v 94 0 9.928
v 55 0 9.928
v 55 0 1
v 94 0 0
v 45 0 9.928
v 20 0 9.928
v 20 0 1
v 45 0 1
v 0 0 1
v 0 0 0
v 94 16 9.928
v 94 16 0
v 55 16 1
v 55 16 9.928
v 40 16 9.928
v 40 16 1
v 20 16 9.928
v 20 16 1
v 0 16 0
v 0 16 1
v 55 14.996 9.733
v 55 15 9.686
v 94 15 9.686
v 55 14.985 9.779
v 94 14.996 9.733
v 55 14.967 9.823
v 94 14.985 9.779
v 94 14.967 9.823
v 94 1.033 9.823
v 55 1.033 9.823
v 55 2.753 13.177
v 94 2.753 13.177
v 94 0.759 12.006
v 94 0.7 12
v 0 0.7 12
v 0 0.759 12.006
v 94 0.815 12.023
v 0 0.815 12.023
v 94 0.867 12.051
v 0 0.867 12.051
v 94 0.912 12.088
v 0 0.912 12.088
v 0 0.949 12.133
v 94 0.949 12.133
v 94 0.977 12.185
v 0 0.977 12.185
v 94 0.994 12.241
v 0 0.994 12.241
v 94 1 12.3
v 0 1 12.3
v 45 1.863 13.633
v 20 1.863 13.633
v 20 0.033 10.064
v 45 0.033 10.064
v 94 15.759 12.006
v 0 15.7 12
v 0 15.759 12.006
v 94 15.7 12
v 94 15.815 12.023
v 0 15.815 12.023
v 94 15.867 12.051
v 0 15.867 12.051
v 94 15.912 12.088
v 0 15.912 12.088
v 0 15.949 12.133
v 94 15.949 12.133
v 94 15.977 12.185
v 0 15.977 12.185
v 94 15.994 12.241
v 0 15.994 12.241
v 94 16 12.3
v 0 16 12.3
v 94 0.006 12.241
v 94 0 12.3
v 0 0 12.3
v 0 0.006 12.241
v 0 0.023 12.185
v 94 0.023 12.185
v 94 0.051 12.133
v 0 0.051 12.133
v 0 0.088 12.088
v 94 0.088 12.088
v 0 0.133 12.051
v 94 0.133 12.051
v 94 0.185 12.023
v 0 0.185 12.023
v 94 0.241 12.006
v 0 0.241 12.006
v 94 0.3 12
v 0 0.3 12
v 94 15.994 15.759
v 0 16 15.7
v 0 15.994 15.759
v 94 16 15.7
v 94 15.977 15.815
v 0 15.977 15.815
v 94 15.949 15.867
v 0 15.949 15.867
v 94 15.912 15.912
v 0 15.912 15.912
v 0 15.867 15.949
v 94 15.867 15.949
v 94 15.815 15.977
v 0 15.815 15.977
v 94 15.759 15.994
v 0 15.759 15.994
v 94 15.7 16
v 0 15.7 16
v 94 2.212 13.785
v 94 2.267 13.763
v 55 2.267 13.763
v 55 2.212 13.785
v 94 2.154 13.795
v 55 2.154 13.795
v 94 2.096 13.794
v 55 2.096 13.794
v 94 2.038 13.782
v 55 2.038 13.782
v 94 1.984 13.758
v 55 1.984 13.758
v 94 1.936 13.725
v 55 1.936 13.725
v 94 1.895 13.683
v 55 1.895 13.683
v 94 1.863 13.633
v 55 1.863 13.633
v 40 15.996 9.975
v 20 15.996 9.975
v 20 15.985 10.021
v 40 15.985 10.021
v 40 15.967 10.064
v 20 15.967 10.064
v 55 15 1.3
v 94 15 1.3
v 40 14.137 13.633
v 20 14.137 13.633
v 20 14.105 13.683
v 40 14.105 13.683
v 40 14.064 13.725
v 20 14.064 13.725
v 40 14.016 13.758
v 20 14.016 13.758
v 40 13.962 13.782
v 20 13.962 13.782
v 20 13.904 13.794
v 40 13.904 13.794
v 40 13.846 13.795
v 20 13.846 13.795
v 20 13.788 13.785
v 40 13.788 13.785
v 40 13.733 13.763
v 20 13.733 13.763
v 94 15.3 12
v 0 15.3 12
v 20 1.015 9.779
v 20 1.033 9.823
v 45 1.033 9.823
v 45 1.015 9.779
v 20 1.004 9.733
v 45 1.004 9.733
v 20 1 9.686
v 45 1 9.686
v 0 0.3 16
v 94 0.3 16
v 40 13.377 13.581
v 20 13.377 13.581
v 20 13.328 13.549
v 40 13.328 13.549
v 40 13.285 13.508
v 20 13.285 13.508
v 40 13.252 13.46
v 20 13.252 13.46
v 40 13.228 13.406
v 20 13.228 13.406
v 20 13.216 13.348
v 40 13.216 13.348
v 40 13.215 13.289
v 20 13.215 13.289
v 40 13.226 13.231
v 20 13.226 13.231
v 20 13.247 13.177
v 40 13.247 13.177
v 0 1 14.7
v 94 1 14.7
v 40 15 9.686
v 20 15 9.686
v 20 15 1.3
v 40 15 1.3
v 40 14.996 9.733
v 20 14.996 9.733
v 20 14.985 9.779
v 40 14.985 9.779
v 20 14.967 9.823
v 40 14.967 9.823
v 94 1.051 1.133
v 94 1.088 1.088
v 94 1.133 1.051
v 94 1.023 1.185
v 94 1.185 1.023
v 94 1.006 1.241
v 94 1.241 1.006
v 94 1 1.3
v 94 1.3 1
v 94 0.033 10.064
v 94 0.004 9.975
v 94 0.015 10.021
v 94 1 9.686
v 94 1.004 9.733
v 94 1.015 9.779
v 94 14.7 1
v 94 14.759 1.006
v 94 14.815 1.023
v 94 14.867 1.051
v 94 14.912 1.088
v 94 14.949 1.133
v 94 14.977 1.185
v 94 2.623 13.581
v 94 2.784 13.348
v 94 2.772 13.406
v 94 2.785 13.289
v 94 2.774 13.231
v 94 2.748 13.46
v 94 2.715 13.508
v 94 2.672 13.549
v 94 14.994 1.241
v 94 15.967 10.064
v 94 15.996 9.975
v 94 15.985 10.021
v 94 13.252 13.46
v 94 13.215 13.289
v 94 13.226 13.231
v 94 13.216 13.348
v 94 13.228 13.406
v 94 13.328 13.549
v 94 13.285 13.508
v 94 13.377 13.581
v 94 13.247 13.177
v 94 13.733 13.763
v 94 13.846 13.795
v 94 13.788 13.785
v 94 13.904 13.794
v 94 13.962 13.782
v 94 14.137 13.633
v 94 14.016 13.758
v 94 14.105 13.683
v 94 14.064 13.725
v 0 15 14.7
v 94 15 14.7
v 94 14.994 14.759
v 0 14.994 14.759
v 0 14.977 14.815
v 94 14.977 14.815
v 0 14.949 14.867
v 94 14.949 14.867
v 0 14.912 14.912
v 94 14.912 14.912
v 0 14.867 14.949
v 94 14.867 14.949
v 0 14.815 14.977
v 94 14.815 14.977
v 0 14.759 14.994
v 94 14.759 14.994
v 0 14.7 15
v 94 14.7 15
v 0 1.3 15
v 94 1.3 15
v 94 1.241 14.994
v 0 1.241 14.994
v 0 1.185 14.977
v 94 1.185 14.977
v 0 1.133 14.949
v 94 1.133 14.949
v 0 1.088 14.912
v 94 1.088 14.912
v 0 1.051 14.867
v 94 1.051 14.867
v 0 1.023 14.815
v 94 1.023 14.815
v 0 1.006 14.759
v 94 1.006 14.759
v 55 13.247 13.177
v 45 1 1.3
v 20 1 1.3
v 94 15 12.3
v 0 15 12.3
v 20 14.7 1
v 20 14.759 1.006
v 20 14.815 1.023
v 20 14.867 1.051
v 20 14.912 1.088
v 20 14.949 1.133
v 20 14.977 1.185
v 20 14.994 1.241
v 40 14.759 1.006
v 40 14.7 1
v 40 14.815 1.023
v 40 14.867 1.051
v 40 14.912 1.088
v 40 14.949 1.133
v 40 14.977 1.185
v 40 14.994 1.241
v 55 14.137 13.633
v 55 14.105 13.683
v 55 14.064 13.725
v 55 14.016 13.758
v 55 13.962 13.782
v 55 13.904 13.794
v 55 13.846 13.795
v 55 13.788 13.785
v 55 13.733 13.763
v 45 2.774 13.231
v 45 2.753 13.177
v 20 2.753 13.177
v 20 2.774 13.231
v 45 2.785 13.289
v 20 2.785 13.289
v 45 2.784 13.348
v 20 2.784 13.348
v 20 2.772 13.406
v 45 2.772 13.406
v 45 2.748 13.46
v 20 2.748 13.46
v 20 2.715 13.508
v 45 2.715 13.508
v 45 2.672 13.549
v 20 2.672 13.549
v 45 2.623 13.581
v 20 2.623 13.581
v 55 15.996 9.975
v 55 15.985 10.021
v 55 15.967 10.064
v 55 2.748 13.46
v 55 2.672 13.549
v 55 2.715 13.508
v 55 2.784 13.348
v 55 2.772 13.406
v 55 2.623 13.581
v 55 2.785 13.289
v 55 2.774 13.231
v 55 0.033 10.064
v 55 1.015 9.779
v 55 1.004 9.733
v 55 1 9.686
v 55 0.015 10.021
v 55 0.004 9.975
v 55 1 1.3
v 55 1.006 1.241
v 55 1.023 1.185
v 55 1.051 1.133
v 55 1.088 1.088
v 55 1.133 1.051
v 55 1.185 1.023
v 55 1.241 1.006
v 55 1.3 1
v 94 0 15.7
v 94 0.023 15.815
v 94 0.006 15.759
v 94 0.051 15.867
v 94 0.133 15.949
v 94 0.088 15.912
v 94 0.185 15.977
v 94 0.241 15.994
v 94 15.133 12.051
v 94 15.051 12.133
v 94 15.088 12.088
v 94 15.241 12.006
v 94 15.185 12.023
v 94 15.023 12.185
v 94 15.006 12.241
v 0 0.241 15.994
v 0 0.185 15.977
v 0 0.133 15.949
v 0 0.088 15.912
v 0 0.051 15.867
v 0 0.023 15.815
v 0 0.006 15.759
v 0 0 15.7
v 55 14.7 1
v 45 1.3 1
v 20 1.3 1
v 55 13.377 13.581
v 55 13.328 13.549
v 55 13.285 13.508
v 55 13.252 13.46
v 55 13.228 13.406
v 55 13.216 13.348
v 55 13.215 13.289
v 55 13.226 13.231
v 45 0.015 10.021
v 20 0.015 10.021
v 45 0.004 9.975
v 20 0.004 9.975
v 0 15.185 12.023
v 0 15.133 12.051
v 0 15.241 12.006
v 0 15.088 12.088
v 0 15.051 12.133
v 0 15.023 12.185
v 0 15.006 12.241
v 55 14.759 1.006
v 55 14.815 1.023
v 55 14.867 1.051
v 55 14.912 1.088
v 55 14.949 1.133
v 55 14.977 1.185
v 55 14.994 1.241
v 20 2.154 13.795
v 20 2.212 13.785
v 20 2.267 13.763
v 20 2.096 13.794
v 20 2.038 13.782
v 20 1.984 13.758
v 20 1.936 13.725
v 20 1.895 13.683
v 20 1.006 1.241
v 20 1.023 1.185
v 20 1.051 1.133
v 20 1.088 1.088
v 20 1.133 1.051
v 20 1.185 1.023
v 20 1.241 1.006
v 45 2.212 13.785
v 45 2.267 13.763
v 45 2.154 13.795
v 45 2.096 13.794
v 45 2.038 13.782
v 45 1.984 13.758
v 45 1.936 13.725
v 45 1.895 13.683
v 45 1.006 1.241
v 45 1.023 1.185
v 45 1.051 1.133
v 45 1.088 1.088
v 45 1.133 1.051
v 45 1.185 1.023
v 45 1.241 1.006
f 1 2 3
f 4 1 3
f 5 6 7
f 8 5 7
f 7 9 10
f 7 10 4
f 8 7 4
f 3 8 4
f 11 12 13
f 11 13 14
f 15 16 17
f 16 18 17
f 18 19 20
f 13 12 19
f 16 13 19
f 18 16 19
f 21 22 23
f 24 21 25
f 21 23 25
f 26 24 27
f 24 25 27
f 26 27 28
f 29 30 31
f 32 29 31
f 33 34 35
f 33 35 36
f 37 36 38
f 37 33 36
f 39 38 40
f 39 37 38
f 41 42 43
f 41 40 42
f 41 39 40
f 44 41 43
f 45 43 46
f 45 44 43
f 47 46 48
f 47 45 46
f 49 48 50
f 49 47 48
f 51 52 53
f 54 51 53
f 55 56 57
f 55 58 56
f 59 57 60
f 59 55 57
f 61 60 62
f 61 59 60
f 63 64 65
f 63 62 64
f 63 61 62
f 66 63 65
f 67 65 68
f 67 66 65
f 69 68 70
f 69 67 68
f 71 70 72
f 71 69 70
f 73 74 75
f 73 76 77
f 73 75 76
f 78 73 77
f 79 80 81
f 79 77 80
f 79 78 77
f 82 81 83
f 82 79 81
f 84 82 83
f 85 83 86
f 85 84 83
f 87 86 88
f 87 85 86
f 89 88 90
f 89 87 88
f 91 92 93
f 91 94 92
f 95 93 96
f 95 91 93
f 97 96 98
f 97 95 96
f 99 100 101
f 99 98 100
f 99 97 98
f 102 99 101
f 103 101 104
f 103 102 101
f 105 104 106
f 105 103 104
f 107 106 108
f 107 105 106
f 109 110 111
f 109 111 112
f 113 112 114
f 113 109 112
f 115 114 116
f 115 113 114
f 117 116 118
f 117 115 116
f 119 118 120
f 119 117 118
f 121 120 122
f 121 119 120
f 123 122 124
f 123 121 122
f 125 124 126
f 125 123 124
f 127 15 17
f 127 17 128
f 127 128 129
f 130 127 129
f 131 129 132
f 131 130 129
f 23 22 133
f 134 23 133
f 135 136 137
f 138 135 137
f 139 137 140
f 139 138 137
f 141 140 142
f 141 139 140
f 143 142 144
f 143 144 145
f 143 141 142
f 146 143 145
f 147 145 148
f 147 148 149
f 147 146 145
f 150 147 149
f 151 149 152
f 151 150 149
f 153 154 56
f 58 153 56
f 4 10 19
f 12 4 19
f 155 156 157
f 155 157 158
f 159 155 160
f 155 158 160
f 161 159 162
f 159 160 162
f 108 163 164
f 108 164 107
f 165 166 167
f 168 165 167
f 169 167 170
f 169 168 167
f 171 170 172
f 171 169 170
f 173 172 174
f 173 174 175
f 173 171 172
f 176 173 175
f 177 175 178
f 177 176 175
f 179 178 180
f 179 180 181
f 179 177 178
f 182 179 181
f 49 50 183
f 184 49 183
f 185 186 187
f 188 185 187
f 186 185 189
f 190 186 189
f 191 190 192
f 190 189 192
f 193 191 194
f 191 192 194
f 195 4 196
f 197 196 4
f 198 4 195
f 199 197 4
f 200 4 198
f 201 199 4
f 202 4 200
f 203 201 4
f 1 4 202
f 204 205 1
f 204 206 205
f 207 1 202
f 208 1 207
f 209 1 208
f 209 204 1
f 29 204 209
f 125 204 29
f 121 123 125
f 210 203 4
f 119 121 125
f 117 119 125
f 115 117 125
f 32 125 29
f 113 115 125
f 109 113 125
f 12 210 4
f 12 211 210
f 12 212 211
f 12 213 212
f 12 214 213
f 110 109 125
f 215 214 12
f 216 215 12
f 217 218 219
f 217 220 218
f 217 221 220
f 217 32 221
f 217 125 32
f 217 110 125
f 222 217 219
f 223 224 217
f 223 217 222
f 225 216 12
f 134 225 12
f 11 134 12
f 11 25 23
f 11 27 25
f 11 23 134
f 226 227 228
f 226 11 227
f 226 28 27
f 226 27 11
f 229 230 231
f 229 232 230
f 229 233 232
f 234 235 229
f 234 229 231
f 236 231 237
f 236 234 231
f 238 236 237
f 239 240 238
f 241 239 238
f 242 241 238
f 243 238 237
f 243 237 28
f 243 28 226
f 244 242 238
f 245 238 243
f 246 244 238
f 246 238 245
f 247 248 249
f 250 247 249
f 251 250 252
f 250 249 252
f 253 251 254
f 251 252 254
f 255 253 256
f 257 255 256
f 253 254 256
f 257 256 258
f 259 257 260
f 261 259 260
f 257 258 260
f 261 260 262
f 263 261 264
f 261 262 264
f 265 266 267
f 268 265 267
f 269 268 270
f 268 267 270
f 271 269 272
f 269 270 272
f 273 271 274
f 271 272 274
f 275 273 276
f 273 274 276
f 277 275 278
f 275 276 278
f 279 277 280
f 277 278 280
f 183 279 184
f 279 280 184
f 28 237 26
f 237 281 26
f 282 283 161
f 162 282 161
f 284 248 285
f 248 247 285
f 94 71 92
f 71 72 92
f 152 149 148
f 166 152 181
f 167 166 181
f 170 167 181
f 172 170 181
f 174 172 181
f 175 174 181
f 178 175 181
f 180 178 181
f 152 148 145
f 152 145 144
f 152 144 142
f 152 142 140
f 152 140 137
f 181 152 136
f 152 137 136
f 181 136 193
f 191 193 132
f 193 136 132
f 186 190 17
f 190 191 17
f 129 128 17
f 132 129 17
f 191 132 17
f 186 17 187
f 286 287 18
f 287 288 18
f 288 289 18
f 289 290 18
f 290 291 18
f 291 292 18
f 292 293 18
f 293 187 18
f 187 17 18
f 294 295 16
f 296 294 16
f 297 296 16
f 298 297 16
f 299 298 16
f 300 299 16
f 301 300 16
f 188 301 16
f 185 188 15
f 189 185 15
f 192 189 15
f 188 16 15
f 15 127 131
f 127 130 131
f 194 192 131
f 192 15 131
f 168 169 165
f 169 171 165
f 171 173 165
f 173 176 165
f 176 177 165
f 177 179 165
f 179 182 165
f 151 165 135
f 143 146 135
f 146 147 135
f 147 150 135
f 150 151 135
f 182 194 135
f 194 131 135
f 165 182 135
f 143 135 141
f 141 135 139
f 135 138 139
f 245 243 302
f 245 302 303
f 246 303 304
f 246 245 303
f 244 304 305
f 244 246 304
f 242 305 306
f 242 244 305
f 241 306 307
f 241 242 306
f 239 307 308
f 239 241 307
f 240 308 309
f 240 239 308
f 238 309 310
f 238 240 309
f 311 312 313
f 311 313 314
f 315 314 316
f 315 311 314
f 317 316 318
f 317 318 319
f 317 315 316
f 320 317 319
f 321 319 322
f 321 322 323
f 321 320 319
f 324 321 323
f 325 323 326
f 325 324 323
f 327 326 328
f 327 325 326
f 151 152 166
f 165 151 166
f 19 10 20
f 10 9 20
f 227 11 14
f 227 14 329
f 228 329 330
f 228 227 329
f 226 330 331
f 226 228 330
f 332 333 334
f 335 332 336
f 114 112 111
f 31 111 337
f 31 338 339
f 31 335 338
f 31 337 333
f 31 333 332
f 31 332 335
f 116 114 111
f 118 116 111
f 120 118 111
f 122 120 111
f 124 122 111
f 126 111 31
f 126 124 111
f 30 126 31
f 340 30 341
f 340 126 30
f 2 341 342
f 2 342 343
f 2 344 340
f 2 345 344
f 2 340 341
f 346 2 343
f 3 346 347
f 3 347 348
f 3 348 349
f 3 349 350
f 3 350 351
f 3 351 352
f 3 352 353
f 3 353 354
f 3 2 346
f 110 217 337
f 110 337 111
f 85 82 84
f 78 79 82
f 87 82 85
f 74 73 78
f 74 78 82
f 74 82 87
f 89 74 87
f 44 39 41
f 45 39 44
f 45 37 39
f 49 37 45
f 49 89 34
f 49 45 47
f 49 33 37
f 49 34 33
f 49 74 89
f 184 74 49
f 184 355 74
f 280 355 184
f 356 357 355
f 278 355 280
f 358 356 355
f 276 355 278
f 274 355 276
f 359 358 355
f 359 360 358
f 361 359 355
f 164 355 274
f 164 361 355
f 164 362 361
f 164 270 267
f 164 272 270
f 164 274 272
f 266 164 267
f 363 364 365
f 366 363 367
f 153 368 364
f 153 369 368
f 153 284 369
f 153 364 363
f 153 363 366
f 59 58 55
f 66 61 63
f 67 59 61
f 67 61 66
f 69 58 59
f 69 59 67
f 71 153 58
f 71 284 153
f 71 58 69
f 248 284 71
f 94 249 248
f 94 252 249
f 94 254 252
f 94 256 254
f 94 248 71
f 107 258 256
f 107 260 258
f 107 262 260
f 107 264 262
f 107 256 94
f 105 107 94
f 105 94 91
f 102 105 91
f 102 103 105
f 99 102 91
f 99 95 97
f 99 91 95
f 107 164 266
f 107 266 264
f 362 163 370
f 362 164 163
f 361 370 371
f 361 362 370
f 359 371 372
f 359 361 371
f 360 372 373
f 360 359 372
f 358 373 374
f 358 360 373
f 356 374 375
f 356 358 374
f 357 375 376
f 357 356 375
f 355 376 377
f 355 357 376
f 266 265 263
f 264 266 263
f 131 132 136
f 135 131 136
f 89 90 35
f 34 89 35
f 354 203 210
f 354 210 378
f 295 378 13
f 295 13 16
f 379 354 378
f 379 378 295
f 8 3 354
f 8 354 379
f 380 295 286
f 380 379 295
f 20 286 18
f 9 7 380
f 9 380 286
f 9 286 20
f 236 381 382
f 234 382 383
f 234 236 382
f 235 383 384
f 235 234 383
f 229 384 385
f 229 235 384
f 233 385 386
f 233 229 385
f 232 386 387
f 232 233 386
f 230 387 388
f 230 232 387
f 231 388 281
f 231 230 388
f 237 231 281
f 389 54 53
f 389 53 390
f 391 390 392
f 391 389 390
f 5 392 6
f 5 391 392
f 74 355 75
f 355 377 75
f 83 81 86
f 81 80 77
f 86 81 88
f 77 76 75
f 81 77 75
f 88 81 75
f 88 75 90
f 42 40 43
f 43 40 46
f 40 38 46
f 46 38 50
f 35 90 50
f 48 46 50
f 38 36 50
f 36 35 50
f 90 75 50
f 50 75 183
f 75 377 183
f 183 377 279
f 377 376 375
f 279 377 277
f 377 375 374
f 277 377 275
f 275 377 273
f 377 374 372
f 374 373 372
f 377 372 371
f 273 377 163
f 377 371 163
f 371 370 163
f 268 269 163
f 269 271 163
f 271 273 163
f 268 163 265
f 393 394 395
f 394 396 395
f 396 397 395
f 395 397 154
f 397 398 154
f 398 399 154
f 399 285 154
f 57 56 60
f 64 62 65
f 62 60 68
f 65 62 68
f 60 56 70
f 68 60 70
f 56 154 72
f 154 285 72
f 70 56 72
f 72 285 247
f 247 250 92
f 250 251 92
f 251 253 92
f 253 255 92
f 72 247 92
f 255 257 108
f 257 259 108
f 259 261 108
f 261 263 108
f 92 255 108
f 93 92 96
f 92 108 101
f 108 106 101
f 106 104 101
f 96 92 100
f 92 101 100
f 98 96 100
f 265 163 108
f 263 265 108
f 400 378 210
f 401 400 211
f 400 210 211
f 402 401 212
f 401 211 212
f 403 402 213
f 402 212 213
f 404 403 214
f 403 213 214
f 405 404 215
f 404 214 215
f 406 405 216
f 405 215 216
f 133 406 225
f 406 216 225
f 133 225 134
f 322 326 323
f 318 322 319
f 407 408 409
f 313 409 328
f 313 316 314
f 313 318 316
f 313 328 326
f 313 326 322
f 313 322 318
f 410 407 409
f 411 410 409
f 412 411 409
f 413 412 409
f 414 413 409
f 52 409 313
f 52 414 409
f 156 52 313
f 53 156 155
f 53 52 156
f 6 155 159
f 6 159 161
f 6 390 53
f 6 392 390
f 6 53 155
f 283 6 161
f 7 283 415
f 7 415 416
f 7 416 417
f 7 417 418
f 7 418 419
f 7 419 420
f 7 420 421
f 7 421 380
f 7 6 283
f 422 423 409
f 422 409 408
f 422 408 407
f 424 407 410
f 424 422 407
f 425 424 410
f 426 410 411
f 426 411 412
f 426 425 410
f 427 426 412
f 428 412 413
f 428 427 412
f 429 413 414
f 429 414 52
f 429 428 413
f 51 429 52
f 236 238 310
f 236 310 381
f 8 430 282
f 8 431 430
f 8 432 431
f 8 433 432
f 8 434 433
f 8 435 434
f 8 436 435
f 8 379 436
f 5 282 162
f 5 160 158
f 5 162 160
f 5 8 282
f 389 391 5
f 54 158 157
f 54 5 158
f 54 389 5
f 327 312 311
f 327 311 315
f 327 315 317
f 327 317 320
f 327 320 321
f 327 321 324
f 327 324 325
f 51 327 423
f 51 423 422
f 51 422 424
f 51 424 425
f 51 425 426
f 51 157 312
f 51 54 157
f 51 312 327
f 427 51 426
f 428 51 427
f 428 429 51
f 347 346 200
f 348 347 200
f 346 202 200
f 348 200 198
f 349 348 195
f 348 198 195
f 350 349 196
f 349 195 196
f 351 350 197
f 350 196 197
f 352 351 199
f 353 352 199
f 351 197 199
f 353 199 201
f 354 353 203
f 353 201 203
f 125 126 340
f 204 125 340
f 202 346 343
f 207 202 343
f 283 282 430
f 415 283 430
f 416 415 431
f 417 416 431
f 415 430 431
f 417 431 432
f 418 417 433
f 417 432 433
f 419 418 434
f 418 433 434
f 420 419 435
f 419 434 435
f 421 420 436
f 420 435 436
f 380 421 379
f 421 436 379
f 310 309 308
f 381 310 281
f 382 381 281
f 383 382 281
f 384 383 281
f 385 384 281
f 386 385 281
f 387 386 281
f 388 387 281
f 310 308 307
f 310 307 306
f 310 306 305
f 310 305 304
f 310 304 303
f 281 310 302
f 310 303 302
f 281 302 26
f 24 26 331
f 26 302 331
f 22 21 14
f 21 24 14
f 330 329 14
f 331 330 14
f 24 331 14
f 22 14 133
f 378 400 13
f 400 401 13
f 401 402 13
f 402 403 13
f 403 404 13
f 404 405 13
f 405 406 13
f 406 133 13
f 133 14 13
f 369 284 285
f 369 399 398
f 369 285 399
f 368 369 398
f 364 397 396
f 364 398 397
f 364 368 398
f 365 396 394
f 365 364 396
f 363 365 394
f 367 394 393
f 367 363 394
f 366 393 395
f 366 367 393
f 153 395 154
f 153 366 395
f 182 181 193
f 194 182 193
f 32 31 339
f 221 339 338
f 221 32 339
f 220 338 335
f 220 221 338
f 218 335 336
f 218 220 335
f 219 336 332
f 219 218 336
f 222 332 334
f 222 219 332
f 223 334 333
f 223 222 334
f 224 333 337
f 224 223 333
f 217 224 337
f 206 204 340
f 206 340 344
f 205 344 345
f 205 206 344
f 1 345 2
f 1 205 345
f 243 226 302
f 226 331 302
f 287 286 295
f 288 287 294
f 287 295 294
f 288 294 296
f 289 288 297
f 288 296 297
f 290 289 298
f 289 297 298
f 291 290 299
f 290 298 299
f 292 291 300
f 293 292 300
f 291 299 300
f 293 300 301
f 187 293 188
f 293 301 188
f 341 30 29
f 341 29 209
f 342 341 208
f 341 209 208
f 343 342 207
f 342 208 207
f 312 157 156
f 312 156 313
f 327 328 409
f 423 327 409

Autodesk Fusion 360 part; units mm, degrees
sketch "16 mm x 16 mm conduit piping shape" plane through (0, 0, 0) normal (1, 0, 0) x (0, 1, 0)
  line L0 (0, 0) -> (16, 0)
  line L1 (16, 0) -> (16, 10)
  line L2 (16, 10) -> (14, 13.9)
  line L3 (14, 13.9) -> (13.1102, 13.4437)
  line L4 (13.1102, 13.4437) -> (15, 9.7585)
  line L5 (15, 9.7585) -> (15, 1)
  line L6 (15, 1) -> (1, 1)
  line L7 (1, 1) -> (1, 9.7585)
  line L8 (1, 9.7585) -> (2.8898, 13.4437)
  line L9 (2.8898, 13.4437) -> (2, 13.9)
  line L10 (2, 13.9) -> (0, 10)
  line L11 (0, 10) -> (0, 0)
  line L12 (0, 16) -> (16, 16)
  line L13 (0, 16) -> (0, 12)
  line L14 (0, 12) -> (1, 12)
  line L15 (1, 12) -> (1, 15)
  line L16 (1, 15) -> (15, 15)
  line L17 (15, 15) -> (15, 12)
  line L18 (15, 12) -> (16, 12)
  line L19 (16, 12) -> (16, 16)
  dimension "d1" = 1
  dimension "d2" = 16
  dimension "d3" = 1
  dimension "d4" = 1
  dimension "d7" = 10
  dimension "d8" = 10
  dimension "d9" = 16
  dimension "d10" = 1
  dimension "d11" = 1
  dimension "d12" = 1
  dimension "d13" = 4
  dimension "d14" = 4
  dimension "d15" = 16
  dimension "d16" = 2
  dimension "d17" = 2
  dimension "d18" = 1
  dimension "d19" = 1
extrude "Extrude1" add sketch "16 mm x 16 mm conduit piping shape" along normal blind 94 makes body 1 at (31.3333, 5.3333, 16) makes body 2 at (31.3333, 5.3333, 0)
fillet "Fillet1" radius 0.3 18 edges at (47, 0, 16) (47, 16, 16) (47, 16, 12) (47, 0, 12) (47, 1, 12) (47, 15, 12) (47, 1, 15) (47, 15, 15) (47, 0, 10) (47, 16, 10) (47, 14, 13.9) (47, 13.1102, 13.4437) (47, 2, 13.9) (47, 2.8898, 13.4437) (47, 15, 1) (47, 1, 1) (47, 1, 9.7585) (47, 15, 9.7585) on bodies 1 2
sketch "Sketch2" plane through (0, 0, 0) normal (0, -1, 0) x (1, 0, 0)
  line L0 (94, 9.9276) -> (0, 9.9276)
  line L1 (0, 9.9276) -> (0, 0)
  line L2 (0, 0) -> (94, 0)
  line L3 (94, 0) -> (94, 9.9276)
  line L4 (0, 15) -> (20, 15)
  line L5 (20, 15) -> (20, 1)
  line L6 (20, 1) -> (0, 1)
  line L7 (0, 1) -> (0, 15)
  line L8 (45, 15) -> (55, 15)
  line L9 (55, 15) -> (55, 1)
  line L10 (55, 1) -> (45, 1)
  line L11 (45, 1) -> (45, 15)
  dimension "d25" = 20
  dimension "d26" = 1
  dimension "d27" = 25
  dimension "d28" = 10
  dimension "d29" = 1
extrude "Extrude2" cut sketch "Sketch2" against normal blind 3 contours L0 L9 L10 L11 | L0 L8 L9 L11 | L0 L1 L5 L6 L7 | L0 L4 L5 L7 bodies 2
sketch "Sketch3" plane through (0, 16, 0) normal (0, 1, 0) x (-1, 0, 0)
  line L0 (0, 9.9276) -> (-94, 9.9276)
  line L1 (-94, 9.9276) -> (-94, 0)
  line L2 (-94, 0) -> (0, 0)
  line L3 (0, 0) -> (0, 9.9276)
  line L4 (0, 15) -> (-20, 15)
  line L5 (-20, 15) -> (-20, 1)
  line L6 (-20, 1) -> (0, 1)
  line L7 (0, 1) -> (0, 15)
  dimension "d32" = 20
  dimension "d33" = 1
extrude "Extrude3" cut sketch "Sketch3" against normal blind 3 contours L0 L3 L5 L6 L7 | L0 L4 L5 L7 bodies 2
sketch "Sketch4" plane through (0, 16, 0) normal (0, 1, 0) x (-1, 0, 0)
  line L0 (-20, 1) -> (-20, 9.9276)
  line L1 (-20, 9.9276) -> (-94, 9.9276)
  line L2 (-94, 9.9276) -> (-94, 0)
  line L3 (-94, 0) -> (0, 0)
  line L4 (0, 0) -> (0, 1)
  line L5 (0, 1) -> (-20, 1)
  line L6 (-45, 1) -> (-45, 15)
  line L7 (-45, 15) -> (-55, 15)
  line L8 (-55, 15) -> (-55, 1)
  line L9 (-55, 1) -> (-45, 1)
  line L10 (-55, 1) -> (-40, 1)
  line L11 (-40, 1) -> (-40, 15)
  line L12 (-40, 15) -> (-55, 15)
  line L13 (-55, 15) -> (-55, 1)
  dimension "d36" = 15
extrude "Extrude4" cut sketch "Sketch4" against normal blind 3 contours L1 L6 L10 L11 | L1 L6 L11 L12 | L1 L6 L8 L9 L10 L13 | L1 L6 L7 L8 L12 L13 bodies 2
equation "d1 = conduitThickness"
equation "d2 = conduitWidth"
equation "d3 = conduitThickness"
equation "d4 = conduitThickness"
equation "conduitThickness = 1 mm" comment "Thickness of the PVC conduit piping"
equation "conduitWidth = 16 mm" comment "Size of the outer dimensions of the conduit piping"
equation "d9 = conduitWidth"
equation "d10 = conduitThickness"
equation "d11 = conduitThickness"
equation "d12 = conduitThickness"
